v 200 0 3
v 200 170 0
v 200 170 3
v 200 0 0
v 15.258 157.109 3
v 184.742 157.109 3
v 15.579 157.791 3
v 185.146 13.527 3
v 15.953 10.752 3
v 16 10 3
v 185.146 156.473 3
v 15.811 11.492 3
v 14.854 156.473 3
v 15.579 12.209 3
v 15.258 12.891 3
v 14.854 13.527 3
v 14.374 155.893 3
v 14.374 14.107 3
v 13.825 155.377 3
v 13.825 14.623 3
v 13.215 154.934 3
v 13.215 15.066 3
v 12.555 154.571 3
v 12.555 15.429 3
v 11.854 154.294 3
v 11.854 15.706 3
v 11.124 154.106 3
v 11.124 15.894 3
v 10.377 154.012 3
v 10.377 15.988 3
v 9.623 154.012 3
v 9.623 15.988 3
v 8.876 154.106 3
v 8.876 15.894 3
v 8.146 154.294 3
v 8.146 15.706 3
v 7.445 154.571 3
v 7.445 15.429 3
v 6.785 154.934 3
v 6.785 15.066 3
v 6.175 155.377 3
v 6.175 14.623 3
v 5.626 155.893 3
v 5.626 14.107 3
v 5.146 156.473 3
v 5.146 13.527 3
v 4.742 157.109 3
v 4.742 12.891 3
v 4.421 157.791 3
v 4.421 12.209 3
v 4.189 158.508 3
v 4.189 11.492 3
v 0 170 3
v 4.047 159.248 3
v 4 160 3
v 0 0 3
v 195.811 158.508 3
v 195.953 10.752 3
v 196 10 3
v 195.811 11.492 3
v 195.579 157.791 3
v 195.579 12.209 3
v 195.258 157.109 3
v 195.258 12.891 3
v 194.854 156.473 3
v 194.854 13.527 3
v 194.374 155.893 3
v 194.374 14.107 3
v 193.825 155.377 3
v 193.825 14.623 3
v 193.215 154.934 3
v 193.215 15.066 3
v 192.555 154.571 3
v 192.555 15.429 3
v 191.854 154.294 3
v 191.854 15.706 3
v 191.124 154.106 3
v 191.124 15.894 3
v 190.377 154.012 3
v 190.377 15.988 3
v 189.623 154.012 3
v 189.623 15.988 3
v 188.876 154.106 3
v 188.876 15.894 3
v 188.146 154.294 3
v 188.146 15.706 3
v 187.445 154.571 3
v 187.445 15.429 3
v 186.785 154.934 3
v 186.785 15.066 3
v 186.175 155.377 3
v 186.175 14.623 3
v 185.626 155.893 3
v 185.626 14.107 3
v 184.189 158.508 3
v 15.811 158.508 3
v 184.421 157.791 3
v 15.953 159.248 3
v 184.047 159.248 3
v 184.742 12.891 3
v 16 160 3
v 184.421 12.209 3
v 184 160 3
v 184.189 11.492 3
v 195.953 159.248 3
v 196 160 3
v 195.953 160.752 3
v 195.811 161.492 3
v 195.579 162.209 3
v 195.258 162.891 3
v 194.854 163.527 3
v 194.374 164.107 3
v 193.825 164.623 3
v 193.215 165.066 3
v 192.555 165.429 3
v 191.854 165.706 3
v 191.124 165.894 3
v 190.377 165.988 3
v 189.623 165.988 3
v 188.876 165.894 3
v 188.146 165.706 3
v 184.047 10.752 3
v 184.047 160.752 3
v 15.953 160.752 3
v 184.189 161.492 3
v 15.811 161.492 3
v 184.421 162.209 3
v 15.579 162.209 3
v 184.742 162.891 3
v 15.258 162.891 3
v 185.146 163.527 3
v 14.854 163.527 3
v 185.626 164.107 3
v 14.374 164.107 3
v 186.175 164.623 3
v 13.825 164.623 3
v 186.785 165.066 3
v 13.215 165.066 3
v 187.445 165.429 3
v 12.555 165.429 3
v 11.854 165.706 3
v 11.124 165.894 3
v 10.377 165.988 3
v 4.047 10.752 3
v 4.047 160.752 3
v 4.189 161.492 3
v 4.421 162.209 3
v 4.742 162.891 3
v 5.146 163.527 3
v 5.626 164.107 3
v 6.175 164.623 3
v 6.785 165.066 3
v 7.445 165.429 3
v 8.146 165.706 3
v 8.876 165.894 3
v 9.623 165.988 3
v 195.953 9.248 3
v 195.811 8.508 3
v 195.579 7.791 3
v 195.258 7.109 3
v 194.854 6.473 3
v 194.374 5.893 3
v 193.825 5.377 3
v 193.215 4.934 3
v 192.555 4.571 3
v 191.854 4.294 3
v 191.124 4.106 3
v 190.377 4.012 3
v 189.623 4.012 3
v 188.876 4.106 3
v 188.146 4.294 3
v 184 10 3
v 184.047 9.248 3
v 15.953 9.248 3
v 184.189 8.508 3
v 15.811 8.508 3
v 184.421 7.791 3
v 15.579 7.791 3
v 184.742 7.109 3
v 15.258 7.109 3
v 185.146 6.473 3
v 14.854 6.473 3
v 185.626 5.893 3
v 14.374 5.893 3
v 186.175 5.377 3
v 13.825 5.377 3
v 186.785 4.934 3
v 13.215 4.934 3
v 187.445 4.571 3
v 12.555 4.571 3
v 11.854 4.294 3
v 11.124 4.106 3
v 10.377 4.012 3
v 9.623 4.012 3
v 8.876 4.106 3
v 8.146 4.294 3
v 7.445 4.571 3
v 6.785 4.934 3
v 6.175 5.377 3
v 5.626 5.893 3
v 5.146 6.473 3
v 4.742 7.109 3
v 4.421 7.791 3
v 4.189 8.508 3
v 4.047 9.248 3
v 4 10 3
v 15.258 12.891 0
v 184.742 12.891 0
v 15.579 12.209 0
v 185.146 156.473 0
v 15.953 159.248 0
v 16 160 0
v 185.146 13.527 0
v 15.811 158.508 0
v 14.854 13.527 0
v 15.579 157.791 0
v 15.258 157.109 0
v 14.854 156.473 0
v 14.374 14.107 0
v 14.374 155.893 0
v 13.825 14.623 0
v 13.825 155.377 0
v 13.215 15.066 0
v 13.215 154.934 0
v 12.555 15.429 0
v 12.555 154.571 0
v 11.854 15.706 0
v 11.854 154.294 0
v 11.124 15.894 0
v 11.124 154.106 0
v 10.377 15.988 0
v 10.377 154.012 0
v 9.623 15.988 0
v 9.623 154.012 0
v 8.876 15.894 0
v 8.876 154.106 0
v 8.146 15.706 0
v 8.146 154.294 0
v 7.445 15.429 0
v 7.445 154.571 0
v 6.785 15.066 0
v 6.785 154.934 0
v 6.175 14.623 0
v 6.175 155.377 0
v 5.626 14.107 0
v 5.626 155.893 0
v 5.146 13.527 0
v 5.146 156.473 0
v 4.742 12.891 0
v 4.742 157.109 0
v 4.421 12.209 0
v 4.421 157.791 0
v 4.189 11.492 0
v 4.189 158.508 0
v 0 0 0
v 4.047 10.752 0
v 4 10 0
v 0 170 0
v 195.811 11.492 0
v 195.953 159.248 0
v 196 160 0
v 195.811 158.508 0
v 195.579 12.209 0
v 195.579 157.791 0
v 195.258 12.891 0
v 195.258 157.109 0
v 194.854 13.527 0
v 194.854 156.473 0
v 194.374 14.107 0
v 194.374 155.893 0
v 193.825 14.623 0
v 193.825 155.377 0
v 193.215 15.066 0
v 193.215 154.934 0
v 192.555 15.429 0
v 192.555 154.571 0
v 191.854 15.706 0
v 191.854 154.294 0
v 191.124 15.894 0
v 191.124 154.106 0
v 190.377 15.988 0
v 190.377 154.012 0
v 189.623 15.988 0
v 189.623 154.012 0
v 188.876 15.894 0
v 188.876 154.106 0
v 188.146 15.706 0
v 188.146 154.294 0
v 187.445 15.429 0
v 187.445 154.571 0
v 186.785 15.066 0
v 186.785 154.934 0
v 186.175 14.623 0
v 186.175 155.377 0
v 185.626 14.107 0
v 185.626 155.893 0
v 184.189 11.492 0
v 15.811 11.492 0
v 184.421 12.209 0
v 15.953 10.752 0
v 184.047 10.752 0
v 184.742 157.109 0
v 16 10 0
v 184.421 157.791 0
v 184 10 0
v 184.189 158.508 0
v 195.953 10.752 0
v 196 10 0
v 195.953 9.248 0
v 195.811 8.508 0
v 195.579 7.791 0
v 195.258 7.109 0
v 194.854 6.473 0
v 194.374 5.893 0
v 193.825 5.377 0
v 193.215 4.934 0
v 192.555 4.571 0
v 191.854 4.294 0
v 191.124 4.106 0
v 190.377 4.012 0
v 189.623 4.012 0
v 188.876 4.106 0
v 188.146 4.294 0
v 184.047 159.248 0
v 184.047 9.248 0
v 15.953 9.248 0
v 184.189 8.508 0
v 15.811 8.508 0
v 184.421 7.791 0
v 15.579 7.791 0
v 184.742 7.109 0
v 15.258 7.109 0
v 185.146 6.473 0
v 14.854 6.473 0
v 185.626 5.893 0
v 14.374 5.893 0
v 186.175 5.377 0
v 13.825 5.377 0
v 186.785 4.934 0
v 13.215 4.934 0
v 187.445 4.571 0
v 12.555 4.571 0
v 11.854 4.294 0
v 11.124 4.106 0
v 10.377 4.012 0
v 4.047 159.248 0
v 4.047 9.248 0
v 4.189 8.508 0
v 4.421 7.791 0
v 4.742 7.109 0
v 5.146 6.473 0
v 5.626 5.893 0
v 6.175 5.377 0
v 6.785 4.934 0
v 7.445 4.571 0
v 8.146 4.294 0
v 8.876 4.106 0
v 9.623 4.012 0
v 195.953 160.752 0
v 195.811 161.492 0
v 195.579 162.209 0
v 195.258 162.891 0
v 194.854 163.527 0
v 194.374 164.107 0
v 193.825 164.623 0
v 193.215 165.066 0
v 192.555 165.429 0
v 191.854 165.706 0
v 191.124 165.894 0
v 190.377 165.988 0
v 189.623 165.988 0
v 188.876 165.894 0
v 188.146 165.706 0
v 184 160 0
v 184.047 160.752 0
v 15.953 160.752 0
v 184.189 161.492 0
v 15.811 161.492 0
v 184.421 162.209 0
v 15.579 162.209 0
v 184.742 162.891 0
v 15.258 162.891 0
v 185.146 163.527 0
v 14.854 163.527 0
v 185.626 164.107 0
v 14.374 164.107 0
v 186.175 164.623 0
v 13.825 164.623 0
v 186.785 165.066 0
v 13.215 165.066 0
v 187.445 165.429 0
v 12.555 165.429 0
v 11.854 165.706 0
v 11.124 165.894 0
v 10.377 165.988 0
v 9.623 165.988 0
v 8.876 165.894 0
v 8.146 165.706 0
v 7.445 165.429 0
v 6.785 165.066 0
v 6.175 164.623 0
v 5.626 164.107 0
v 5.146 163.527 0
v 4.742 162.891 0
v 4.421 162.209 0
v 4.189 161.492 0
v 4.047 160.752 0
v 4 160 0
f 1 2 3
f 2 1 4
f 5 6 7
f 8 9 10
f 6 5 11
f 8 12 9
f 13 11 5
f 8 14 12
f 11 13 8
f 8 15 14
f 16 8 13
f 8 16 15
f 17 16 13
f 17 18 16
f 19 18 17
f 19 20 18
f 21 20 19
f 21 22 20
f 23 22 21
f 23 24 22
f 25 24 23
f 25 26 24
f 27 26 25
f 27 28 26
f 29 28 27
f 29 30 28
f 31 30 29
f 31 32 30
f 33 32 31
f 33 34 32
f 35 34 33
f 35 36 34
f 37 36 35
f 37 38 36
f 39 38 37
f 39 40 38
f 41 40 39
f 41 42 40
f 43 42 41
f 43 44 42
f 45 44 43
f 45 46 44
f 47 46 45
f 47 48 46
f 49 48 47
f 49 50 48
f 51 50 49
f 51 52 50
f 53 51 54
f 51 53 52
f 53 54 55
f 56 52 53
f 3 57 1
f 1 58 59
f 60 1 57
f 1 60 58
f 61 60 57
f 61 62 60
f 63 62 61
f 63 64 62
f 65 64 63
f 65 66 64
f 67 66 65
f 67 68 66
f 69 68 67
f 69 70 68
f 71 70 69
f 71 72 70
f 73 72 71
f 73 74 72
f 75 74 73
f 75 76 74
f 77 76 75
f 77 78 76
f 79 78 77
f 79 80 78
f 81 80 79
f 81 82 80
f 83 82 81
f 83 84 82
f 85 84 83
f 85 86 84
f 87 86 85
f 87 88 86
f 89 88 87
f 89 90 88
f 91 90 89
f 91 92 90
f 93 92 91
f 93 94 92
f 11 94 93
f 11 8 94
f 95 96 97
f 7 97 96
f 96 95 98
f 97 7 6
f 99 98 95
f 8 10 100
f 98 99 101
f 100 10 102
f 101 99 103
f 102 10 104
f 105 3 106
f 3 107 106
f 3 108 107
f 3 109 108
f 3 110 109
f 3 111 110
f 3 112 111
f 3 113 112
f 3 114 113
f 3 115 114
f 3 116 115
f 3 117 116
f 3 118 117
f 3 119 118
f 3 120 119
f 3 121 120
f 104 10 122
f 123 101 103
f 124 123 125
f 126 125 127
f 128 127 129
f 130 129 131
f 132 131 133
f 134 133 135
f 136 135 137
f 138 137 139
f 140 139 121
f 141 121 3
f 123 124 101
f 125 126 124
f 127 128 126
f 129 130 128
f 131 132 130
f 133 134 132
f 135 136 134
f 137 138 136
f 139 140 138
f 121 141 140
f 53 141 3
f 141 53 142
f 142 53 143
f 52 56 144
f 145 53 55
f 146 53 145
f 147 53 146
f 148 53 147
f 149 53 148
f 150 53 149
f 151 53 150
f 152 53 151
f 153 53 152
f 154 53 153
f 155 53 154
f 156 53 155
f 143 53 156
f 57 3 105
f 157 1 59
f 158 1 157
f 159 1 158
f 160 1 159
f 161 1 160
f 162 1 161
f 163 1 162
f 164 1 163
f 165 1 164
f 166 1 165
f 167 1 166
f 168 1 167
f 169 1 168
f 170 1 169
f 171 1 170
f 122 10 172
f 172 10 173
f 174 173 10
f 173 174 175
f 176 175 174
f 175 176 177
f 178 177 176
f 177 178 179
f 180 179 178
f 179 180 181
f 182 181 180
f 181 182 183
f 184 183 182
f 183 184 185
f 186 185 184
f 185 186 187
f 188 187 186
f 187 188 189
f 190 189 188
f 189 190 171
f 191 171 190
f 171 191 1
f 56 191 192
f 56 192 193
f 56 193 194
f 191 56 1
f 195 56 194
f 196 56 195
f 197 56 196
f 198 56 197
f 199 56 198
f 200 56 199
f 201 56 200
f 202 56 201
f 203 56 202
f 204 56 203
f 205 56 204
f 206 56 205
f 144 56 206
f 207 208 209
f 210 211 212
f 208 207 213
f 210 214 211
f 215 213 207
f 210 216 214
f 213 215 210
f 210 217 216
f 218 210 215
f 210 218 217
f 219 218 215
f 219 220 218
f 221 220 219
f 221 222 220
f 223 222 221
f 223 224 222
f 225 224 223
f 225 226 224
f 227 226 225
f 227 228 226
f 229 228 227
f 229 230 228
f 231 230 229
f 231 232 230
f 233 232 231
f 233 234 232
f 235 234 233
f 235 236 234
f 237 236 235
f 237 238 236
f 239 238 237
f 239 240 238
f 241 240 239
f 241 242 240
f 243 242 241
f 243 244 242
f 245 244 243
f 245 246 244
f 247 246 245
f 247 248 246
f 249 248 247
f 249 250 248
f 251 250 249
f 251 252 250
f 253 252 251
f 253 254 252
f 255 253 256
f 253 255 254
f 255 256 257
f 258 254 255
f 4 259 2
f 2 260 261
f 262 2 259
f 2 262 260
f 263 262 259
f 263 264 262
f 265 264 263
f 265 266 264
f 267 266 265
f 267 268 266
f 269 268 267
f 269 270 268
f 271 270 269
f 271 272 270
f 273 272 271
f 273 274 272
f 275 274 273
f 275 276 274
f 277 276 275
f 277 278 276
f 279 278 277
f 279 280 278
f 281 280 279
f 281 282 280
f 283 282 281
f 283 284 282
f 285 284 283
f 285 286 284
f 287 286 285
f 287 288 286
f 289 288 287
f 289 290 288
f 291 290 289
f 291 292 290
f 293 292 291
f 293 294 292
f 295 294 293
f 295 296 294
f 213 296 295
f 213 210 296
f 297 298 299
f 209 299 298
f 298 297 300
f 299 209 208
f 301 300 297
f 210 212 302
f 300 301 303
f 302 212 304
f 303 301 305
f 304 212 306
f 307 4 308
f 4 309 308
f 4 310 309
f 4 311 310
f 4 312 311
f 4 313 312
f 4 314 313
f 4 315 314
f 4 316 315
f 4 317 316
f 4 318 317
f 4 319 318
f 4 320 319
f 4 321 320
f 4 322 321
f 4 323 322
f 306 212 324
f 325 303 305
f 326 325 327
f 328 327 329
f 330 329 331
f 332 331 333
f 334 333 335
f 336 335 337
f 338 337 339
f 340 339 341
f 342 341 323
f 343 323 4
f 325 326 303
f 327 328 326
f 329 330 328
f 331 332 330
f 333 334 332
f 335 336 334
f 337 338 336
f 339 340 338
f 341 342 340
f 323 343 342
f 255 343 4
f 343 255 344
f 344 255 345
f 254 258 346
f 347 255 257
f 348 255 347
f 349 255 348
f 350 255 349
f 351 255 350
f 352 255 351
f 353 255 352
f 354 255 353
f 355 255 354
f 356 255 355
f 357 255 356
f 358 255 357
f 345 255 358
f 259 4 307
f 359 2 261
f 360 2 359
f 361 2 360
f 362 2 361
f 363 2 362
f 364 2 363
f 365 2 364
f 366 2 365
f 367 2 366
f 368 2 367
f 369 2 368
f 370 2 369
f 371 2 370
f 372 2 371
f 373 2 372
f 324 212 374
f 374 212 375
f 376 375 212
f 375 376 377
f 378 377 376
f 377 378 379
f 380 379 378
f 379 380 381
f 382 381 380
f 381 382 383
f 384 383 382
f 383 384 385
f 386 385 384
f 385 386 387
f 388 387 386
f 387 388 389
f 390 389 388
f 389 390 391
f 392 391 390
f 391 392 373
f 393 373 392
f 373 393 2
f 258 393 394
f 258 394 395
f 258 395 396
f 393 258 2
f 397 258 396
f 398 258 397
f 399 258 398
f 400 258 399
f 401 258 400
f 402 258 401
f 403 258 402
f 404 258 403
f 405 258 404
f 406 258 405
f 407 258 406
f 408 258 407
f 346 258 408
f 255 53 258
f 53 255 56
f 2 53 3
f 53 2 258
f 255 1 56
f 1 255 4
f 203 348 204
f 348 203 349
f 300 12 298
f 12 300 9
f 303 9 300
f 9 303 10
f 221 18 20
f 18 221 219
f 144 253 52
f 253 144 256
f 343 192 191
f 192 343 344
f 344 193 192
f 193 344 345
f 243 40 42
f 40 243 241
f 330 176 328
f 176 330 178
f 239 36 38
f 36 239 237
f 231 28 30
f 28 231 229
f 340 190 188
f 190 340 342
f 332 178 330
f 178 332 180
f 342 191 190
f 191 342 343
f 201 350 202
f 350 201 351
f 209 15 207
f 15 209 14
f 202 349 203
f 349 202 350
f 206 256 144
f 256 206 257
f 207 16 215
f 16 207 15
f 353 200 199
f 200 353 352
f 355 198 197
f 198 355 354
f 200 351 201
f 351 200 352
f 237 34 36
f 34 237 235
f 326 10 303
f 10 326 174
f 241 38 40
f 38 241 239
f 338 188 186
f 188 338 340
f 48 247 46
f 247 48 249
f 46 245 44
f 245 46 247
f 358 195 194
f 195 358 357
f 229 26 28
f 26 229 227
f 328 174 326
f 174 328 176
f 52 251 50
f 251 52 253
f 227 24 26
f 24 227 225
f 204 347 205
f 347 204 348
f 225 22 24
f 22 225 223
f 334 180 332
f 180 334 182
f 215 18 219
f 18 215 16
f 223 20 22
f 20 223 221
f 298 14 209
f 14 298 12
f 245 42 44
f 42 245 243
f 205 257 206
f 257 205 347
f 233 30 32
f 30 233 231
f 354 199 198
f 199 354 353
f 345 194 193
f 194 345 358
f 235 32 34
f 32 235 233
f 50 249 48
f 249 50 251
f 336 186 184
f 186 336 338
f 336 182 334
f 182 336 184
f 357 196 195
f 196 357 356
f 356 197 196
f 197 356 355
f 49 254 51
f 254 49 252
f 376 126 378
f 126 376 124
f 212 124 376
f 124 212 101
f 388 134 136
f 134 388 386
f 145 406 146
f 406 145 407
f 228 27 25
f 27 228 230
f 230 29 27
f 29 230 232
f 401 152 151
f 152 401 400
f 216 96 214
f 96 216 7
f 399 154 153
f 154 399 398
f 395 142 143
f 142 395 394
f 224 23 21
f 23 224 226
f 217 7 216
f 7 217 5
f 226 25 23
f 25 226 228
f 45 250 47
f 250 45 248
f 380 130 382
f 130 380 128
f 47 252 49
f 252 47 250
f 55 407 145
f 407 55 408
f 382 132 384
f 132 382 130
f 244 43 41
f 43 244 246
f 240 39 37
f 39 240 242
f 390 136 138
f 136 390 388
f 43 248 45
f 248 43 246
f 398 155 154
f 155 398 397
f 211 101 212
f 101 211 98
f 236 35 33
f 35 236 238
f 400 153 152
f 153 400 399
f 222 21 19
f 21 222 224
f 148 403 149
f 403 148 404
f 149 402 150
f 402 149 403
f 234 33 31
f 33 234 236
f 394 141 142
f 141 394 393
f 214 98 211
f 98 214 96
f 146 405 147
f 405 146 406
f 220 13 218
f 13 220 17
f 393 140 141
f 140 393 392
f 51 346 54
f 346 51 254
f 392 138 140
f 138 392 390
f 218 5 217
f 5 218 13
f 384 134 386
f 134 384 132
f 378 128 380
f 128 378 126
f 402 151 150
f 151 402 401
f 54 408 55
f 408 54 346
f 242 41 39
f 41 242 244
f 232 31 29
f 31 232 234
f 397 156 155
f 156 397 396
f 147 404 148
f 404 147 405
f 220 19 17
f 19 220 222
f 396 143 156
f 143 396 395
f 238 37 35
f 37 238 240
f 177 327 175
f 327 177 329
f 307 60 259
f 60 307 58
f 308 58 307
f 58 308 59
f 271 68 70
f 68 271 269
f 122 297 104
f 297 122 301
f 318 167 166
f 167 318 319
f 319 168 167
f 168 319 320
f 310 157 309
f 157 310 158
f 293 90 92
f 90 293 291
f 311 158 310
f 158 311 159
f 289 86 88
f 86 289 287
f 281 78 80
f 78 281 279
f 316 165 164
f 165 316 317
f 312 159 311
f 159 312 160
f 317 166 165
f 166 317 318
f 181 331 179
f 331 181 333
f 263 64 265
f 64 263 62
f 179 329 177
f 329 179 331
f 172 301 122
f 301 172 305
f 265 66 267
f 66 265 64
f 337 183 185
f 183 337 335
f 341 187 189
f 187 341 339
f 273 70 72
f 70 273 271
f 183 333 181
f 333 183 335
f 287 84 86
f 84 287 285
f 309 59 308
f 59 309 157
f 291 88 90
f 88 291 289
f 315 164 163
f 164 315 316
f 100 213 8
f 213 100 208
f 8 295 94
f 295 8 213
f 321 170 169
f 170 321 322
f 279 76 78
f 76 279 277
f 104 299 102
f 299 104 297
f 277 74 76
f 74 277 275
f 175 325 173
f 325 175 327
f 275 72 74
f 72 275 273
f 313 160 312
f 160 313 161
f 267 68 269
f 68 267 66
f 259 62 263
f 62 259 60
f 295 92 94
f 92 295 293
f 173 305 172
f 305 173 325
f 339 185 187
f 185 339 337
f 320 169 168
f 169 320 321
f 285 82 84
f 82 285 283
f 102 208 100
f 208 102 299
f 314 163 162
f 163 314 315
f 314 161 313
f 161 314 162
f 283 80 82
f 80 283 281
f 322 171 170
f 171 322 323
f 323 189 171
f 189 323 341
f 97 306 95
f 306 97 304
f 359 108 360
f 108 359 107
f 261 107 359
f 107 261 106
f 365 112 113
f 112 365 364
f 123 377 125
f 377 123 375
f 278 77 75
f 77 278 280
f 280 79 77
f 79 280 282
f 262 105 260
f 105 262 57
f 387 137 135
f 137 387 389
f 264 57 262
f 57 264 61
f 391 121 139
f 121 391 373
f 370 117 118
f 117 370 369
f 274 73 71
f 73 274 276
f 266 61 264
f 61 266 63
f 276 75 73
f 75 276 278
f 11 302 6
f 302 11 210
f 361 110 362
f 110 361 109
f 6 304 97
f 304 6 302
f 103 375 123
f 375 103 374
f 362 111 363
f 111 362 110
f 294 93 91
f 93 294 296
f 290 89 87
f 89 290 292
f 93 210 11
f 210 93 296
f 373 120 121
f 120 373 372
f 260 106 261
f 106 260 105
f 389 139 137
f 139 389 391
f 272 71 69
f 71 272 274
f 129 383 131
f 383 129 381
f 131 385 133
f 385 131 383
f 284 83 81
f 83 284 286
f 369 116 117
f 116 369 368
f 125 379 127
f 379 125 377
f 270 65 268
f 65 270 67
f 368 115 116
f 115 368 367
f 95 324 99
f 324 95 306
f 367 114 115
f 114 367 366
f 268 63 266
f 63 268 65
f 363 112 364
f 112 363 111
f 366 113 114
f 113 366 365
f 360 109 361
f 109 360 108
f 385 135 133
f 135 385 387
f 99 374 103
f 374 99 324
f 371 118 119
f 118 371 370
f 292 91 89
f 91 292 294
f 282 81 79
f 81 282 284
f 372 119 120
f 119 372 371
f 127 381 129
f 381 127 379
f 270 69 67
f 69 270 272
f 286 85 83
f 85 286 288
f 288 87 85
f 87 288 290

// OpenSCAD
// file: Tray.scad
module SupportBottom()
{
    cylinder(h=4, r=6, $fn=50);
}

module SupportTop()
{
    cylinder(h=40, r=8, $fn=50);
    translate([0, 0, 40])
        cylinder(h=3.9, r=5.9, $fn=50);
}

// Create the tray base and support pillars in a module, so that we can use
// Difference to carve out the holes for the bases and the bottom of the support pillars.
module Tray(tray_width, tray_length, tray_height)
{
    cube([tray_width, tray_length, tray_height]);

    // Add in the four supports in the corners.
    translate([10, 10, tray_height])
        SupportTop();
    translate([10, tray_length-10, tray_height])
        SupportTop();
    translate([tray_width-10, 10, tray_height])
        SupportTop();
    translate([tray_width-10, tray_length-10, tray_height])
        SupportTop();
}
// main file
include <Tray.scad>

tray_width = 200;
tray_length = 170;
tray_height = 3;

difference()
{
    cube([tray_width, tray_length, tray_height]);
    
    // Put in the four holes on the bottom of the base for the supports to fit into.
    translate([10, 10, 0])
        SupportBottom();
    translate([10, tray_length-10, 0])
        SupportBottom();
    translate([tray_width-10, 10, 0])
        SupportBottom();
    translate([tray_width-10, tray_length-10, 0])
        SupportBottom();
}
